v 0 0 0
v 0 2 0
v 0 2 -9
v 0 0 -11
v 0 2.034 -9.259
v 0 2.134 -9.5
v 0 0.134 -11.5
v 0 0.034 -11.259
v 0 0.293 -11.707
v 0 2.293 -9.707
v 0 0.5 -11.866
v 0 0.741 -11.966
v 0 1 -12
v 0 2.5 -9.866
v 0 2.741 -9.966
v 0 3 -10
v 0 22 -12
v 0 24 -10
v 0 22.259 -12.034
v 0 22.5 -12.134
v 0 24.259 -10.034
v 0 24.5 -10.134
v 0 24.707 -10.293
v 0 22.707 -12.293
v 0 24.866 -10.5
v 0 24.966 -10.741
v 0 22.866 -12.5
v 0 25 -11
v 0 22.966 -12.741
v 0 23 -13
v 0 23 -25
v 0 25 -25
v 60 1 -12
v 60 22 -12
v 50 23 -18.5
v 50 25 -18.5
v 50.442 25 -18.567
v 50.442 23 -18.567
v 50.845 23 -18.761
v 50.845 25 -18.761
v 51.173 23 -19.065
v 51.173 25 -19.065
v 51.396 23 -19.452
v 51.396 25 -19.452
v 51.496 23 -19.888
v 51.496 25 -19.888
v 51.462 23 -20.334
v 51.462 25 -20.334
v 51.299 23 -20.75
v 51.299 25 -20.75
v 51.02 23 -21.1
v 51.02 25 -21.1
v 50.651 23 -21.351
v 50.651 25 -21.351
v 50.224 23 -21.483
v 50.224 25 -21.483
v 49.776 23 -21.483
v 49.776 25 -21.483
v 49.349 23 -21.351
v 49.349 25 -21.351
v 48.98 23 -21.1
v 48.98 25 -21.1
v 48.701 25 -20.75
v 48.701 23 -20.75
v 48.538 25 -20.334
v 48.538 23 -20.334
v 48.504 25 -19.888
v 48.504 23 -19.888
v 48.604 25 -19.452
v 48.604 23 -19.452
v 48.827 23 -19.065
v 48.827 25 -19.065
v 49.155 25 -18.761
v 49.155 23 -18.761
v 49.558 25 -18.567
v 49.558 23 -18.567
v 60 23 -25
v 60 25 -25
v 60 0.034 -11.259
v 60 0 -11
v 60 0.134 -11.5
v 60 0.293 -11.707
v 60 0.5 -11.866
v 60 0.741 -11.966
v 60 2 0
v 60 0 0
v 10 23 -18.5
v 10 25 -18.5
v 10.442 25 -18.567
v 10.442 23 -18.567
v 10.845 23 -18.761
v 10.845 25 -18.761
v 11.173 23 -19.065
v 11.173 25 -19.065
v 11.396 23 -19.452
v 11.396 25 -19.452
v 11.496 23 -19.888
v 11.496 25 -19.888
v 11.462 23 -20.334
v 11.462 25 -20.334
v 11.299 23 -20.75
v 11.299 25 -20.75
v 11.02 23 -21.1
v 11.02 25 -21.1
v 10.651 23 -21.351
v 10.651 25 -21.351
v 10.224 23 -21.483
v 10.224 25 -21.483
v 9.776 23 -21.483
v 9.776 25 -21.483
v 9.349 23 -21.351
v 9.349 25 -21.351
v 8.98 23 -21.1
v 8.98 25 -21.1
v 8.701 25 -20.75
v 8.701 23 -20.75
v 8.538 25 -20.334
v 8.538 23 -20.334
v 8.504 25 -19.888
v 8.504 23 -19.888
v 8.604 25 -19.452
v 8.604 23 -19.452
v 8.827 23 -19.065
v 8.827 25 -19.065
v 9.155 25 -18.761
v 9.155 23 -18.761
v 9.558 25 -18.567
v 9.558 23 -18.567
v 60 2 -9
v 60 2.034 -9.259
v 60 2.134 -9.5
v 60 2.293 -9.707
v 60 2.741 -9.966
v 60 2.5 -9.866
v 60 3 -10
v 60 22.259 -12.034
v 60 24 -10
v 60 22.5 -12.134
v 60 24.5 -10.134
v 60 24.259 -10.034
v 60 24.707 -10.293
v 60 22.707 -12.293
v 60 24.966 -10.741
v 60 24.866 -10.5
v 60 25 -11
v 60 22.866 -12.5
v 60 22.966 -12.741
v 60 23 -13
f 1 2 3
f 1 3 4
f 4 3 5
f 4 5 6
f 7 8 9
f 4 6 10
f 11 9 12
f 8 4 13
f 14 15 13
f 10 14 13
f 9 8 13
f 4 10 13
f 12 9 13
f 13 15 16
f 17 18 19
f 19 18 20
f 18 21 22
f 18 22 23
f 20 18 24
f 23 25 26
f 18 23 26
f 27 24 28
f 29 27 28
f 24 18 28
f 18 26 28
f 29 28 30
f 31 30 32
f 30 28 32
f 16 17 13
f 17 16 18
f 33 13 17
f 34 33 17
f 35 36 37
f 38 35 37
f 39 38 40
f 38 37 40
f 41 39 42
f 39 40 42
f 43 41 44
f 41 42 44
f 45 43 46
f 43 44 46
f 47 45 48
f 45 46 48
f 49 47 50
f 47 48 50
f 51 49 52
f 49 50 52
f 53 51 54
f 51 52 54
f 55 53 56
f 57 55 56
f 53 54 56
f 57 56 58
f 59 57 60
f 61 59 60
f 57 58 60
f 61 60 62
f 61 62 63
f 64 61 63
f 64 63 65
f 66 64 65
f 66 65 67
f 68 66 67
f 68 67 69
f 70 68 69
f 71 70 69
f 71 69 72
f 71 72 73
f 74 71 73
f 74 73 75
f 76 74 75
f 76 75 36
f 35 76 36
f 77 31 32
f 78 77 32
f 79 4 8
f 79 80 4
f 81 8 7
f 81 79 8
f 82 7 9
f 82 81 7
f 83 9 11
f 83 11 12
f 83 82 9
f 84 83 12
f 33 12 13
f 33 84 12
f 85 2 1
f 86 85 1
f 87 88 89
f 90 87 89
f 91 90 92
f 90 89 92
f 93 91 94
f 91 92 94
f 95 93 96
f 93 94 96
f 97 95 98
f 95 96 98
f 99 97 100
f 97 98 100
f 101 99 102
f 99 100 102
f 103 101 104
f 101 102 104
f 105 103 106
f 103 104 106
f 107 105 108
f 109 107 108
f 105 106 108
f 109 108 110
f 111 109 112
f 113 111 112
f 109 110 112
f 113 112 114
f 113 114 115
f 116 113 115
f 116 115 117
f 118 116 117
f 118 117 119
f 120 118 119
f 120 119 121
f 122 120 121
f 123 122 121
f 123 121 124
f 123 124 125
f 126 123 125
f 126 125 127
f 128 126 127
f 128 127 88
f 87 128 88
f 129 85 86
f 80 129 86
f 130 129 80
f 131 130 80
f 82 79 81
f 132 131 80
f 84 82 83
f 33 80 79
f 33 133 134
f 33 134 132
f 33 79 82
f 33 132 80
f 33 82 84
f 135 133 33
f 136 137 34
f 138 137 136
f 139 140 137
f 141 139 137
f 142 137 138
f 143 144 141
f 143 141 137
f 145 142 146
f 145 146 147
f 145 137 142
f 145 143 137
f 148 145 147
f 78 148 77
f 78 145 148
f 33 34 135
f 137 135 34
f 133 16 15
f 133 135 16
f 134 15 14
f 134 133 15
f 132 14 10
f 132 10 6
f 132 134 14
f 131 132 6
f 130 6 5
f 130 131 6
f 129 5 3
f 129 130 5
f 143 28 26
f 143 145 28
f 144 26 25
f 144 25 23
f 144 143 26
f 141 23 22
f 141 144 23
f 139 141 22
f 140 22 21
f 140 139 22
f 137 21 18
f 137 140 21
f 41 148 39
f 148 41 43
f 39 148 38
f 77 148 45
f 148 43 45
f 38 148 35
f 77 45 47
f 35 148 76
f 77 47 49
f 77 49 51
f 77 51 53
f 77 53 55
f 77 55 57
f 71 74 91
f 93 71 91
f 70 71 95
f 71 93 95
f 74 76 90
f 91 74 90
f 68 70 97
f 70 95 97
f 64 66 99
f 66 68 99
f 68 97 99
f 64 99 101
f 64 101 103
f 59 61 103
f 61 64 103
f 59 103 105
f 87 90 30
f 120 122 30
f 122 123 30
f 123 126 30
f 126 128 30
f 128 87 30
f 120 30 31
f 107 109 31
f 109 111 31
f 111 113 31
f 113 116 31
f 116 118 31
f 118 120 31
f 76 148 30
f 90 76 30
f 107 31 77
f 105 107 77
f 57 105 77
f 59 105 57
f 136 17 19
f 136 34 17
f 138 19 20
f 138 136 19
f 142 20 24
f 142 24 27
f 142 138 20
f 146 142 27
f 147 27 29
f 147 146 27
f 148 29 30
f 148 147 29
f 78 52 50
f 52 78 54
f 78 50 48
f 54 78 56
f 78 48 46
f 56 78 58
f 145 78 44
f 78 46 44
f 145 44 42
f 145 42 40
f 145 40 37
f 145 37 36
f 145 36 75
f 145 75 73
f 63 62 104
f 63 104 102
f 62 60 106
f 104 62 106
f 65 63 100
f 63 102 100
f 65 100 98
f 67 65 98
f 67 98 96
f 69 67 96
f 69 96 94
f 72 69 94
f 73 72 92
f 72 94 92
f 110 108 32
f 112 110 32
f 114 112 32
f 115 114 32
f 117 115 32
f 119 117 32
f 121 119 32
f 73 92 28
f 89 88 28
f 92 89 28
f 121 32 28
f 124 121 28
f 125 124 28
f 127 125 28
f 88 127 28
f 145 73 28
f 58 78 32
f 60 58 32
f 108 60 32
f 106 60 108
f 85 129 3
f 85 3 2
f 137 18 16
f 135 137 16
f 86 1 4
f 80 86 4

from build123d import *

# Parameters (mm, degrees)
BOSS_EXTRUDE1_DEPTH = 60
FILLET1_R           = 1
SKETCH2_R           = 1.5
CUT_EXTRUDE1_DEPTH  = 40


with BuildPart() as part:
    # Sketch1 → Boss-Extrude1 (new body)
    with BuildSketch(Plane(origin=(0, 0, 0), x_dir=(0, 0, -1), z_dir=(1, 0, 0))):
        Polygon((0, 2), (0, 0), (12, 0), (12, 23), (25, 23), (25, 25), (22, 25), (10, 25), (10, 2), align=None)
    extrude(amount=BOSS_EXTRUDE1_DEPTH)

    # Fillet1
    fillet1_edges = [part.edges().sort_by_distance(p)[0] for p in [
        (30, 23, -12),
        (30, 0, -12),
        (30, 2, -10),
        (30, 25, -10),
    ]]
    fillet(fillet1_edges, radius=FILLET1_R)

    # Sketch2 → Cut-Extrude1 (cut)
    with BuildSketch(Plane(origin=(0, 25, 0), x_dir=(1, 0, 0), z_dir=(0, 1, 0))):
        with Locations(Location((10, 20, 0), (0, 0, 270))):
            Circle(SKETCH2_R)
        with Locations(Location((50, 20, 0), (0, 0, 270))):
            Circle(SKETCH2_R)
    extrude(amount=-CUT_EXTRUDE1_DEPTH, mode=Mode.SUBTRACT)


solid = part.part
